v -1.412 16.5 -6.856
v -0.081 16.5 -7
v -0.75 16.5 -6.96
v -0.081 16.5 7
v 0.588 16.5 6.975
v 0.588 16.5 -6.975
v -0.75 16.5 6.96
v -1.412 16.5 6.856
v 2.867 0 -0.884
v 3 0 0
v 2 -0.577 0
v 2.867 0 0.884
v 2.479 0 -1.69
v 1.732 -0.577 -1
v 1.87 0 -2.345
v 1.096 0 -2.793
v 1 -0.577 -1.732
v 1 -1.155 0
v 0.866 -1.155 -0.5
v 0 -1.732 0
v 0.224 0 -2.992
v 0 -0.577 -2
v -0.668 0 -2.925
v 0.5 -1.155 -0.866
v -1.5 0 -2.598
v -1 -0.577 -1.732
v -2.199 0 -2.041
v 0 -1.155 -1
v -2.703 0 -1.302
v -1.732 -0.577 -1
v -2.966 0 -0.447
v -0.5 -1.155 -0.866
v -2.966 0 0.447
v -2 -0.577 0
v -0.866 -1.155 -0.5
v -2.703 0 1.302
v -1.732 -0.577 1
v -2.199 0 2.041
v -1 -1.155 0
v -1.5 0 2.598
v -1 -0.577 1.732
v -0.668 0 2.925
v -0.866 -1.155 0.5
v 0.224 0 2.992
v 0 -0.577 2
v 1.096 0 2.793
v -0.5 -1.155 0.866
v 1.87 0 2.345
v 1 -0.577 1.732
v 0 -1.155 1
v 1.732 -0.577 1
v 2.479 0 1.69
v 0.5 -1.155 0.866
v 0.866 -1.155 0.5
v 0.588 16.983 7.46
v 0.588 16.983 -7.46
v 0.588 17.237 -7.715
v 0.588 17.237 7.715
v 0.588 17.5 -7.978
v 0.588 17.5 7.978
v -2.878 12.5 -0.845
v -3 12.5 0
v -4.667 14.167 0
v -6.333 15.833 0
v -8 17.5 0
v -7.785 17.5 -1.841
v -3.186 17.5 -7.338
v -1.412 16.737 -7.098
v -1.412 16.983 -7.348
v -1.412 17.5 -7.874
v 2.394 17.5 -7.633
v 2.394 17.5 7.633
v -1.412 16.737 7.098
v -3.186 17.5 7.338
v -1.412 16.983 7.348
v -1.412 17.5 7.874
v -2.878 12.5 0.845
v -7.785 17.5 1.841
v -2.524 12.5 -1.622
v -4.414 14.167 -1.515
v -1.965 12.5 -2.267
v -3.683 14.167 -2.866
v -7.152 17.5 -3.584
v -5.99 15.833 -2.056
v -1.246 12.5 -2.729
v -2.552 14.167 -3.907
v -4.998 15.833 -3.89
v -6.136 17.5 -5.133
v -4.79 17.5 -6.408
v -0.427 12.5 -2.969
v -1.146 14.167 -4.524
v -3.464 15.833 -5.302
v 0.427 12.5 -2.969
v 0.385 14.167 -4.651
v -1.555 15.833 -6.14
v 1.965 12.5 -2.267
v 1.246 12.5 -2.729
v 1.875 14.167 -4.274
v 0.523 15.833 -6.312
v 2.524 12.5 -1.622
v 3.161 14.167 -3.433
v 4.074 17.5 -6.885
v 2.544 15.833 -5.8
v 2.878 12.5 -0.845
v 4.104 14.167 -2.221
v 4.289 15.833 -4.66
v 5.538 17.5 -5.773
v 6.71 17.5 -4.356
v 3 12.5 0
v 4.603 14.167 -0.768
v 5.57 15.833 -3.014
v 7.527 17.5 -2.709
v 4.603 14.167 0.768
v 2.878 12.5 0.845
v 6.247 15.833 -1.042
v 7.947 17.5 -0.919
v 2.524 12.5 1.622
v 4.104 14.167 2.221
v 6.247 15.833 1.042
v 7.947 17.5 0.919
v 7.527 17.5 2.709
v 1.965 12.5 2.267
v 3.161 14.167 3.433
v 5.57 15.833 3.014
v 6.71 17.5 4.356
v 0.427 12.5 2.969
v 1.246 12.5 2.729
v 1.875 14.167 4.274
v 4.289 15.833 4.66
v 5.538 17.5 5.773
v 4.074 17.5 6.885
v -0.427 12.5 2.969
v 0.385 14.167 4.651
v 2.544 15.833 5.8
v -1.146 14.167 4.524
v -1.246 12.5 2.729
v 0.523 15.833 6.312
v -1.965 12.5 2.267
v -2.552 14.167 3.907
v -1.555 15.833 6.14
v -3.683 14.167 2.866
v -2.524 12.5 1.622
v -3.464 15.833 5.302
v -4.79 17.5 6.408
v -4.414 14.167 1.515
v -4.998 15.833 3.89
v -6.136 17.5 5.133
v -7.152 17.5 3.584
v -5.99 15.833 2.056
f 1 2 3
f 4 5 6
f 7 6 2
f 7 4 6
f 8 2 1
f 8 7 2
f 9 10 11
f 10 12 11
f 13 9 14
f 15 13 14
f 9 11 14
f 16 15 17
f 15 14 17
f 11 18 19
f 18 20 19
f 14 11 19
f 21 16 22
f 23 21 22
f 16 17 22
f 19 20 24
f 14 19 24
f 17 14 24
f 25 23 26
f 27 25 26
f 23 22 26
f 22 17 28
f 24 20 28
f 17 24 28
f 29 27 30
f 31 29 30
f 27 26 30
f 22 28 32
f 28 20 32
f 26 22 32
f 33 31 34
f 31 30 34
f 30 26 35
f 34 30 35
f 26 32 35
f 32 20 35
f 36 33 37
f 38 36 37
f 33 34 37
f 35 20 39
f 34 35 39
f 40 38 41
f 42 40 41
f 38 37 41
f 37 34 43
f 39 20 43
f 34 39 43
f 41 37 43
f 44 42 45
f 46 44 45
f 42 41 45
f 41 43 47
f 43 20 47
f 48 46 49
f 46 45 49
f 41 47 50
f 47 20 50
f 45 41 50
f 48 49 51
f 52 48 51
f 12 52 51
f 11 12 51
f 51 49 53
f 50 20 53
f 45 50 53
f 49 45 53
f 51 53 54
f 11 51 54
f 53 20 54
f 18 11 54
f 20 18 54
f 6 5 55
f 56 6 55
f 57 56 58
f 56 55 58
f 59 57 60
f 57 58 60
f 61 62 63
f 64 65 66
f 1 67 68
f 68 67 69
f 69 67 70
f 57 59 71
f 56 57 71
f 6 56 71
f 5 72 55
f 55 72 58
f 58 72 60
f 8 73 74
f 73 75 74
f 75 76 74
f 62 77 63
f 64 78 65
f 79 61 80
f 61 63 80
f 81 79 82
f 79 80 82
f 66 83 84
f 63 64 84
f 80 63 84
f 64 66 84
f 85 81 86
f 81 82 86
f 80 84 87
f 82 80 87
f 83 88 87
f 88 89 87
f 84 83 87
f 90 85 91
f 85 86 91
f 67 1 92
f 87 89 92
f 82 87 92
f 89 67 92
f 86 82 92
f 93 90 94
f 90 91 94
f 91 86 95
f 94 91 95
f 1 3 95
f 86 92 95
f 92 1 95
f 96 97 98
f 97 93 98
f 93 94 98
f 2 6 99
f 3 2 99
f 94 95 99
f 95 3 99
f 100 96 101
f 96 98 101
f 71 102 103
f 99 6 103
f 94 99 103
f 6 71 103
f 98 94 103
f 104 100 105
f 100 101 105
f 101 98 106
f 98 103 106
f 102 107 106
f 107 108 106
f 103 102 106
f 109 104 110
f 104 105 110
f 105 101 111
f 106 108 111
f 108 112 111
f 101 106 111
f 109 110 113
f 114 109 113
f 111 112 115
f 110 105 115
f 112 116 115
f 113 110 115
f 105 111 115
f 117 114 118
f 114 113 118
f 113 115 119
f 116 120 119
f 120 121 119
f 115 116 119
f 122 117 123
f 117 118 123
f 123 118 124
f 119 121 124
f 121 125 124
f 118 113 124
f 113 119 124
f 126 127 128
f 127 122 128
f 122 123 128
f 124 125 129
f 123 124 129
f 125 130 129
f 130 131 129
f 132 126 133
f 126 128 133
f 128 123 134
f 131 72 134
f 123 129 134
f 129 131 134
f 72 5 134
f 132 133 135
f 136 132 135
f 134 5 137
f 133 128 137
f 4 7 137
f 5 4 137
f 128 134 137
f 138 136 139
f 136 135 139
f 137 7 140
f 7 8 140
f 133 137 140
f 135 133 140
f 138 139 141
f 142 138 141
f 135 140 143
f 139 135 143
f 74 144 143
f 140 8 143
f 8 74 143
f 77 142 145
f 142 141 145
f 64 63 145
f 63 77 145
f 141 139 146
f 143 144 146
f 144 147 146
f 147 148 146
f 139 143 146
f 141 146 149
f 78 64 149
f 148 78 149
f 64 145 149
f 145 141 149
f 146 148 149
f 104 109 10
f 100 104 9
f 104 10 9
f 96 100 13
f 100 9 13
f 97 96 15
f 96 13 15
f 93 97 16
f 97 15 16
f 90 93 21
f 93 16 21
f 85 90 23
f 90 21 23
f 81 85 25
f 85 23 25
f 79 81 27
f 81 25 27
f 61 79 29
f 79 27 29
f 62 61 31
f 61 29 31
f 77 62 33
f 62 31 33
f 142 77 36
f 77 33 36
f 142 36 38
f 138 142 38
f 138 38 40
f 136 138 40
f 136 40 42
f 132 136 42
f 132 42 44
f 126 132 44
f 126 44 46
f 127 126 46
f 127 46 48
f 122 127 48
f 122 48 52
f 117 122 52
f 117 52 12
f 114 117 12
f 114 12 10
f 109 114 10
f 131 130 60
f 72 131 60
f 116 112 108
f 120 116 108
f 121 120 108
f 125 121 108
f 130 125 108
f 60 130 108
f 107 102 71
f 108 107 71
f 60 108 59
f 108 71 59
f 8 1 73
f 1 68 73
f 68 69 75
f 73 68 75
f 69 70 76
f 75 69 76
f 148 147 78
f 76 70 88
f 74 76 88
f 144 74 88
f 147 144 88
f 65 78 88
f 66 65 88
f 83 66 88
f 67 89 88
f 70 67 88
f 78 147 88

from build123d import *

# Parameters (mm, degrees)
SKETCH1_R               = 3
BOSS_EXTRUDE1_DEPTH     = 12.5
CUT_EXTRUDE4_DEPTH      = 9
CUT_EXTRUDE4_DEPTH_BACK = 9


with BuildPart() as part:
    # Sketch1 → Boss-Extrude1 (new body)
    with BuildSketch(Plane(origin=(0, 0, 0), x_dir=(1, 0, 0), z_dir=(0, 1, 0))):
        Circle(SKETCH1_R)
    extrude(amount=BOSS_EXTRUDE1_DEPTH)

    # Sketch3 → Revolve1 (revolve)
    with BuildSketch(Plane.XY):
        Polygon((-3, 12.5), (-8, 17.5), (0, 17.5), (0, 12.5), align=None)
    revolve(axis=Axis((0, 17.5, 0), (0, -1, 0)))

    # Sketch4 → Cut-Extrude4 (cut, two sides)
    with BuildSketch(Plane.XY) as cut_extrude4_sk:
        Polygon((0.588175988, 67.243680335), (0.588175988, 17.501049711), (0.588175988, 16.5), (-1.411824012, 16.5), (-1.411824012, 17.501049711), (-1.411824012, 67.243680335), (-1.411824012, 166.728941583), (0.588175988, 166.728941583), align=None)
    extrude(amount=CUT_EXTRUDE4_DEPTH, mode=Mode.SUBTRACT)
    extrude(cut_extrude4_sk.sketch, amount=-CUT_EXTRUDE4_DEPTH_BACK, mode=Mode.SUBTRACT)

    # Sketch6 → Revolve2 (revolve)
    with BuildSketch(Plane.XY):
        Polygon((3, 0), (0, -1.732050808), (0, 0), align=None)
    revolve(axis=Axis((0, -1.732050808, 0), (0, 1, 0)))


solid = part.part
